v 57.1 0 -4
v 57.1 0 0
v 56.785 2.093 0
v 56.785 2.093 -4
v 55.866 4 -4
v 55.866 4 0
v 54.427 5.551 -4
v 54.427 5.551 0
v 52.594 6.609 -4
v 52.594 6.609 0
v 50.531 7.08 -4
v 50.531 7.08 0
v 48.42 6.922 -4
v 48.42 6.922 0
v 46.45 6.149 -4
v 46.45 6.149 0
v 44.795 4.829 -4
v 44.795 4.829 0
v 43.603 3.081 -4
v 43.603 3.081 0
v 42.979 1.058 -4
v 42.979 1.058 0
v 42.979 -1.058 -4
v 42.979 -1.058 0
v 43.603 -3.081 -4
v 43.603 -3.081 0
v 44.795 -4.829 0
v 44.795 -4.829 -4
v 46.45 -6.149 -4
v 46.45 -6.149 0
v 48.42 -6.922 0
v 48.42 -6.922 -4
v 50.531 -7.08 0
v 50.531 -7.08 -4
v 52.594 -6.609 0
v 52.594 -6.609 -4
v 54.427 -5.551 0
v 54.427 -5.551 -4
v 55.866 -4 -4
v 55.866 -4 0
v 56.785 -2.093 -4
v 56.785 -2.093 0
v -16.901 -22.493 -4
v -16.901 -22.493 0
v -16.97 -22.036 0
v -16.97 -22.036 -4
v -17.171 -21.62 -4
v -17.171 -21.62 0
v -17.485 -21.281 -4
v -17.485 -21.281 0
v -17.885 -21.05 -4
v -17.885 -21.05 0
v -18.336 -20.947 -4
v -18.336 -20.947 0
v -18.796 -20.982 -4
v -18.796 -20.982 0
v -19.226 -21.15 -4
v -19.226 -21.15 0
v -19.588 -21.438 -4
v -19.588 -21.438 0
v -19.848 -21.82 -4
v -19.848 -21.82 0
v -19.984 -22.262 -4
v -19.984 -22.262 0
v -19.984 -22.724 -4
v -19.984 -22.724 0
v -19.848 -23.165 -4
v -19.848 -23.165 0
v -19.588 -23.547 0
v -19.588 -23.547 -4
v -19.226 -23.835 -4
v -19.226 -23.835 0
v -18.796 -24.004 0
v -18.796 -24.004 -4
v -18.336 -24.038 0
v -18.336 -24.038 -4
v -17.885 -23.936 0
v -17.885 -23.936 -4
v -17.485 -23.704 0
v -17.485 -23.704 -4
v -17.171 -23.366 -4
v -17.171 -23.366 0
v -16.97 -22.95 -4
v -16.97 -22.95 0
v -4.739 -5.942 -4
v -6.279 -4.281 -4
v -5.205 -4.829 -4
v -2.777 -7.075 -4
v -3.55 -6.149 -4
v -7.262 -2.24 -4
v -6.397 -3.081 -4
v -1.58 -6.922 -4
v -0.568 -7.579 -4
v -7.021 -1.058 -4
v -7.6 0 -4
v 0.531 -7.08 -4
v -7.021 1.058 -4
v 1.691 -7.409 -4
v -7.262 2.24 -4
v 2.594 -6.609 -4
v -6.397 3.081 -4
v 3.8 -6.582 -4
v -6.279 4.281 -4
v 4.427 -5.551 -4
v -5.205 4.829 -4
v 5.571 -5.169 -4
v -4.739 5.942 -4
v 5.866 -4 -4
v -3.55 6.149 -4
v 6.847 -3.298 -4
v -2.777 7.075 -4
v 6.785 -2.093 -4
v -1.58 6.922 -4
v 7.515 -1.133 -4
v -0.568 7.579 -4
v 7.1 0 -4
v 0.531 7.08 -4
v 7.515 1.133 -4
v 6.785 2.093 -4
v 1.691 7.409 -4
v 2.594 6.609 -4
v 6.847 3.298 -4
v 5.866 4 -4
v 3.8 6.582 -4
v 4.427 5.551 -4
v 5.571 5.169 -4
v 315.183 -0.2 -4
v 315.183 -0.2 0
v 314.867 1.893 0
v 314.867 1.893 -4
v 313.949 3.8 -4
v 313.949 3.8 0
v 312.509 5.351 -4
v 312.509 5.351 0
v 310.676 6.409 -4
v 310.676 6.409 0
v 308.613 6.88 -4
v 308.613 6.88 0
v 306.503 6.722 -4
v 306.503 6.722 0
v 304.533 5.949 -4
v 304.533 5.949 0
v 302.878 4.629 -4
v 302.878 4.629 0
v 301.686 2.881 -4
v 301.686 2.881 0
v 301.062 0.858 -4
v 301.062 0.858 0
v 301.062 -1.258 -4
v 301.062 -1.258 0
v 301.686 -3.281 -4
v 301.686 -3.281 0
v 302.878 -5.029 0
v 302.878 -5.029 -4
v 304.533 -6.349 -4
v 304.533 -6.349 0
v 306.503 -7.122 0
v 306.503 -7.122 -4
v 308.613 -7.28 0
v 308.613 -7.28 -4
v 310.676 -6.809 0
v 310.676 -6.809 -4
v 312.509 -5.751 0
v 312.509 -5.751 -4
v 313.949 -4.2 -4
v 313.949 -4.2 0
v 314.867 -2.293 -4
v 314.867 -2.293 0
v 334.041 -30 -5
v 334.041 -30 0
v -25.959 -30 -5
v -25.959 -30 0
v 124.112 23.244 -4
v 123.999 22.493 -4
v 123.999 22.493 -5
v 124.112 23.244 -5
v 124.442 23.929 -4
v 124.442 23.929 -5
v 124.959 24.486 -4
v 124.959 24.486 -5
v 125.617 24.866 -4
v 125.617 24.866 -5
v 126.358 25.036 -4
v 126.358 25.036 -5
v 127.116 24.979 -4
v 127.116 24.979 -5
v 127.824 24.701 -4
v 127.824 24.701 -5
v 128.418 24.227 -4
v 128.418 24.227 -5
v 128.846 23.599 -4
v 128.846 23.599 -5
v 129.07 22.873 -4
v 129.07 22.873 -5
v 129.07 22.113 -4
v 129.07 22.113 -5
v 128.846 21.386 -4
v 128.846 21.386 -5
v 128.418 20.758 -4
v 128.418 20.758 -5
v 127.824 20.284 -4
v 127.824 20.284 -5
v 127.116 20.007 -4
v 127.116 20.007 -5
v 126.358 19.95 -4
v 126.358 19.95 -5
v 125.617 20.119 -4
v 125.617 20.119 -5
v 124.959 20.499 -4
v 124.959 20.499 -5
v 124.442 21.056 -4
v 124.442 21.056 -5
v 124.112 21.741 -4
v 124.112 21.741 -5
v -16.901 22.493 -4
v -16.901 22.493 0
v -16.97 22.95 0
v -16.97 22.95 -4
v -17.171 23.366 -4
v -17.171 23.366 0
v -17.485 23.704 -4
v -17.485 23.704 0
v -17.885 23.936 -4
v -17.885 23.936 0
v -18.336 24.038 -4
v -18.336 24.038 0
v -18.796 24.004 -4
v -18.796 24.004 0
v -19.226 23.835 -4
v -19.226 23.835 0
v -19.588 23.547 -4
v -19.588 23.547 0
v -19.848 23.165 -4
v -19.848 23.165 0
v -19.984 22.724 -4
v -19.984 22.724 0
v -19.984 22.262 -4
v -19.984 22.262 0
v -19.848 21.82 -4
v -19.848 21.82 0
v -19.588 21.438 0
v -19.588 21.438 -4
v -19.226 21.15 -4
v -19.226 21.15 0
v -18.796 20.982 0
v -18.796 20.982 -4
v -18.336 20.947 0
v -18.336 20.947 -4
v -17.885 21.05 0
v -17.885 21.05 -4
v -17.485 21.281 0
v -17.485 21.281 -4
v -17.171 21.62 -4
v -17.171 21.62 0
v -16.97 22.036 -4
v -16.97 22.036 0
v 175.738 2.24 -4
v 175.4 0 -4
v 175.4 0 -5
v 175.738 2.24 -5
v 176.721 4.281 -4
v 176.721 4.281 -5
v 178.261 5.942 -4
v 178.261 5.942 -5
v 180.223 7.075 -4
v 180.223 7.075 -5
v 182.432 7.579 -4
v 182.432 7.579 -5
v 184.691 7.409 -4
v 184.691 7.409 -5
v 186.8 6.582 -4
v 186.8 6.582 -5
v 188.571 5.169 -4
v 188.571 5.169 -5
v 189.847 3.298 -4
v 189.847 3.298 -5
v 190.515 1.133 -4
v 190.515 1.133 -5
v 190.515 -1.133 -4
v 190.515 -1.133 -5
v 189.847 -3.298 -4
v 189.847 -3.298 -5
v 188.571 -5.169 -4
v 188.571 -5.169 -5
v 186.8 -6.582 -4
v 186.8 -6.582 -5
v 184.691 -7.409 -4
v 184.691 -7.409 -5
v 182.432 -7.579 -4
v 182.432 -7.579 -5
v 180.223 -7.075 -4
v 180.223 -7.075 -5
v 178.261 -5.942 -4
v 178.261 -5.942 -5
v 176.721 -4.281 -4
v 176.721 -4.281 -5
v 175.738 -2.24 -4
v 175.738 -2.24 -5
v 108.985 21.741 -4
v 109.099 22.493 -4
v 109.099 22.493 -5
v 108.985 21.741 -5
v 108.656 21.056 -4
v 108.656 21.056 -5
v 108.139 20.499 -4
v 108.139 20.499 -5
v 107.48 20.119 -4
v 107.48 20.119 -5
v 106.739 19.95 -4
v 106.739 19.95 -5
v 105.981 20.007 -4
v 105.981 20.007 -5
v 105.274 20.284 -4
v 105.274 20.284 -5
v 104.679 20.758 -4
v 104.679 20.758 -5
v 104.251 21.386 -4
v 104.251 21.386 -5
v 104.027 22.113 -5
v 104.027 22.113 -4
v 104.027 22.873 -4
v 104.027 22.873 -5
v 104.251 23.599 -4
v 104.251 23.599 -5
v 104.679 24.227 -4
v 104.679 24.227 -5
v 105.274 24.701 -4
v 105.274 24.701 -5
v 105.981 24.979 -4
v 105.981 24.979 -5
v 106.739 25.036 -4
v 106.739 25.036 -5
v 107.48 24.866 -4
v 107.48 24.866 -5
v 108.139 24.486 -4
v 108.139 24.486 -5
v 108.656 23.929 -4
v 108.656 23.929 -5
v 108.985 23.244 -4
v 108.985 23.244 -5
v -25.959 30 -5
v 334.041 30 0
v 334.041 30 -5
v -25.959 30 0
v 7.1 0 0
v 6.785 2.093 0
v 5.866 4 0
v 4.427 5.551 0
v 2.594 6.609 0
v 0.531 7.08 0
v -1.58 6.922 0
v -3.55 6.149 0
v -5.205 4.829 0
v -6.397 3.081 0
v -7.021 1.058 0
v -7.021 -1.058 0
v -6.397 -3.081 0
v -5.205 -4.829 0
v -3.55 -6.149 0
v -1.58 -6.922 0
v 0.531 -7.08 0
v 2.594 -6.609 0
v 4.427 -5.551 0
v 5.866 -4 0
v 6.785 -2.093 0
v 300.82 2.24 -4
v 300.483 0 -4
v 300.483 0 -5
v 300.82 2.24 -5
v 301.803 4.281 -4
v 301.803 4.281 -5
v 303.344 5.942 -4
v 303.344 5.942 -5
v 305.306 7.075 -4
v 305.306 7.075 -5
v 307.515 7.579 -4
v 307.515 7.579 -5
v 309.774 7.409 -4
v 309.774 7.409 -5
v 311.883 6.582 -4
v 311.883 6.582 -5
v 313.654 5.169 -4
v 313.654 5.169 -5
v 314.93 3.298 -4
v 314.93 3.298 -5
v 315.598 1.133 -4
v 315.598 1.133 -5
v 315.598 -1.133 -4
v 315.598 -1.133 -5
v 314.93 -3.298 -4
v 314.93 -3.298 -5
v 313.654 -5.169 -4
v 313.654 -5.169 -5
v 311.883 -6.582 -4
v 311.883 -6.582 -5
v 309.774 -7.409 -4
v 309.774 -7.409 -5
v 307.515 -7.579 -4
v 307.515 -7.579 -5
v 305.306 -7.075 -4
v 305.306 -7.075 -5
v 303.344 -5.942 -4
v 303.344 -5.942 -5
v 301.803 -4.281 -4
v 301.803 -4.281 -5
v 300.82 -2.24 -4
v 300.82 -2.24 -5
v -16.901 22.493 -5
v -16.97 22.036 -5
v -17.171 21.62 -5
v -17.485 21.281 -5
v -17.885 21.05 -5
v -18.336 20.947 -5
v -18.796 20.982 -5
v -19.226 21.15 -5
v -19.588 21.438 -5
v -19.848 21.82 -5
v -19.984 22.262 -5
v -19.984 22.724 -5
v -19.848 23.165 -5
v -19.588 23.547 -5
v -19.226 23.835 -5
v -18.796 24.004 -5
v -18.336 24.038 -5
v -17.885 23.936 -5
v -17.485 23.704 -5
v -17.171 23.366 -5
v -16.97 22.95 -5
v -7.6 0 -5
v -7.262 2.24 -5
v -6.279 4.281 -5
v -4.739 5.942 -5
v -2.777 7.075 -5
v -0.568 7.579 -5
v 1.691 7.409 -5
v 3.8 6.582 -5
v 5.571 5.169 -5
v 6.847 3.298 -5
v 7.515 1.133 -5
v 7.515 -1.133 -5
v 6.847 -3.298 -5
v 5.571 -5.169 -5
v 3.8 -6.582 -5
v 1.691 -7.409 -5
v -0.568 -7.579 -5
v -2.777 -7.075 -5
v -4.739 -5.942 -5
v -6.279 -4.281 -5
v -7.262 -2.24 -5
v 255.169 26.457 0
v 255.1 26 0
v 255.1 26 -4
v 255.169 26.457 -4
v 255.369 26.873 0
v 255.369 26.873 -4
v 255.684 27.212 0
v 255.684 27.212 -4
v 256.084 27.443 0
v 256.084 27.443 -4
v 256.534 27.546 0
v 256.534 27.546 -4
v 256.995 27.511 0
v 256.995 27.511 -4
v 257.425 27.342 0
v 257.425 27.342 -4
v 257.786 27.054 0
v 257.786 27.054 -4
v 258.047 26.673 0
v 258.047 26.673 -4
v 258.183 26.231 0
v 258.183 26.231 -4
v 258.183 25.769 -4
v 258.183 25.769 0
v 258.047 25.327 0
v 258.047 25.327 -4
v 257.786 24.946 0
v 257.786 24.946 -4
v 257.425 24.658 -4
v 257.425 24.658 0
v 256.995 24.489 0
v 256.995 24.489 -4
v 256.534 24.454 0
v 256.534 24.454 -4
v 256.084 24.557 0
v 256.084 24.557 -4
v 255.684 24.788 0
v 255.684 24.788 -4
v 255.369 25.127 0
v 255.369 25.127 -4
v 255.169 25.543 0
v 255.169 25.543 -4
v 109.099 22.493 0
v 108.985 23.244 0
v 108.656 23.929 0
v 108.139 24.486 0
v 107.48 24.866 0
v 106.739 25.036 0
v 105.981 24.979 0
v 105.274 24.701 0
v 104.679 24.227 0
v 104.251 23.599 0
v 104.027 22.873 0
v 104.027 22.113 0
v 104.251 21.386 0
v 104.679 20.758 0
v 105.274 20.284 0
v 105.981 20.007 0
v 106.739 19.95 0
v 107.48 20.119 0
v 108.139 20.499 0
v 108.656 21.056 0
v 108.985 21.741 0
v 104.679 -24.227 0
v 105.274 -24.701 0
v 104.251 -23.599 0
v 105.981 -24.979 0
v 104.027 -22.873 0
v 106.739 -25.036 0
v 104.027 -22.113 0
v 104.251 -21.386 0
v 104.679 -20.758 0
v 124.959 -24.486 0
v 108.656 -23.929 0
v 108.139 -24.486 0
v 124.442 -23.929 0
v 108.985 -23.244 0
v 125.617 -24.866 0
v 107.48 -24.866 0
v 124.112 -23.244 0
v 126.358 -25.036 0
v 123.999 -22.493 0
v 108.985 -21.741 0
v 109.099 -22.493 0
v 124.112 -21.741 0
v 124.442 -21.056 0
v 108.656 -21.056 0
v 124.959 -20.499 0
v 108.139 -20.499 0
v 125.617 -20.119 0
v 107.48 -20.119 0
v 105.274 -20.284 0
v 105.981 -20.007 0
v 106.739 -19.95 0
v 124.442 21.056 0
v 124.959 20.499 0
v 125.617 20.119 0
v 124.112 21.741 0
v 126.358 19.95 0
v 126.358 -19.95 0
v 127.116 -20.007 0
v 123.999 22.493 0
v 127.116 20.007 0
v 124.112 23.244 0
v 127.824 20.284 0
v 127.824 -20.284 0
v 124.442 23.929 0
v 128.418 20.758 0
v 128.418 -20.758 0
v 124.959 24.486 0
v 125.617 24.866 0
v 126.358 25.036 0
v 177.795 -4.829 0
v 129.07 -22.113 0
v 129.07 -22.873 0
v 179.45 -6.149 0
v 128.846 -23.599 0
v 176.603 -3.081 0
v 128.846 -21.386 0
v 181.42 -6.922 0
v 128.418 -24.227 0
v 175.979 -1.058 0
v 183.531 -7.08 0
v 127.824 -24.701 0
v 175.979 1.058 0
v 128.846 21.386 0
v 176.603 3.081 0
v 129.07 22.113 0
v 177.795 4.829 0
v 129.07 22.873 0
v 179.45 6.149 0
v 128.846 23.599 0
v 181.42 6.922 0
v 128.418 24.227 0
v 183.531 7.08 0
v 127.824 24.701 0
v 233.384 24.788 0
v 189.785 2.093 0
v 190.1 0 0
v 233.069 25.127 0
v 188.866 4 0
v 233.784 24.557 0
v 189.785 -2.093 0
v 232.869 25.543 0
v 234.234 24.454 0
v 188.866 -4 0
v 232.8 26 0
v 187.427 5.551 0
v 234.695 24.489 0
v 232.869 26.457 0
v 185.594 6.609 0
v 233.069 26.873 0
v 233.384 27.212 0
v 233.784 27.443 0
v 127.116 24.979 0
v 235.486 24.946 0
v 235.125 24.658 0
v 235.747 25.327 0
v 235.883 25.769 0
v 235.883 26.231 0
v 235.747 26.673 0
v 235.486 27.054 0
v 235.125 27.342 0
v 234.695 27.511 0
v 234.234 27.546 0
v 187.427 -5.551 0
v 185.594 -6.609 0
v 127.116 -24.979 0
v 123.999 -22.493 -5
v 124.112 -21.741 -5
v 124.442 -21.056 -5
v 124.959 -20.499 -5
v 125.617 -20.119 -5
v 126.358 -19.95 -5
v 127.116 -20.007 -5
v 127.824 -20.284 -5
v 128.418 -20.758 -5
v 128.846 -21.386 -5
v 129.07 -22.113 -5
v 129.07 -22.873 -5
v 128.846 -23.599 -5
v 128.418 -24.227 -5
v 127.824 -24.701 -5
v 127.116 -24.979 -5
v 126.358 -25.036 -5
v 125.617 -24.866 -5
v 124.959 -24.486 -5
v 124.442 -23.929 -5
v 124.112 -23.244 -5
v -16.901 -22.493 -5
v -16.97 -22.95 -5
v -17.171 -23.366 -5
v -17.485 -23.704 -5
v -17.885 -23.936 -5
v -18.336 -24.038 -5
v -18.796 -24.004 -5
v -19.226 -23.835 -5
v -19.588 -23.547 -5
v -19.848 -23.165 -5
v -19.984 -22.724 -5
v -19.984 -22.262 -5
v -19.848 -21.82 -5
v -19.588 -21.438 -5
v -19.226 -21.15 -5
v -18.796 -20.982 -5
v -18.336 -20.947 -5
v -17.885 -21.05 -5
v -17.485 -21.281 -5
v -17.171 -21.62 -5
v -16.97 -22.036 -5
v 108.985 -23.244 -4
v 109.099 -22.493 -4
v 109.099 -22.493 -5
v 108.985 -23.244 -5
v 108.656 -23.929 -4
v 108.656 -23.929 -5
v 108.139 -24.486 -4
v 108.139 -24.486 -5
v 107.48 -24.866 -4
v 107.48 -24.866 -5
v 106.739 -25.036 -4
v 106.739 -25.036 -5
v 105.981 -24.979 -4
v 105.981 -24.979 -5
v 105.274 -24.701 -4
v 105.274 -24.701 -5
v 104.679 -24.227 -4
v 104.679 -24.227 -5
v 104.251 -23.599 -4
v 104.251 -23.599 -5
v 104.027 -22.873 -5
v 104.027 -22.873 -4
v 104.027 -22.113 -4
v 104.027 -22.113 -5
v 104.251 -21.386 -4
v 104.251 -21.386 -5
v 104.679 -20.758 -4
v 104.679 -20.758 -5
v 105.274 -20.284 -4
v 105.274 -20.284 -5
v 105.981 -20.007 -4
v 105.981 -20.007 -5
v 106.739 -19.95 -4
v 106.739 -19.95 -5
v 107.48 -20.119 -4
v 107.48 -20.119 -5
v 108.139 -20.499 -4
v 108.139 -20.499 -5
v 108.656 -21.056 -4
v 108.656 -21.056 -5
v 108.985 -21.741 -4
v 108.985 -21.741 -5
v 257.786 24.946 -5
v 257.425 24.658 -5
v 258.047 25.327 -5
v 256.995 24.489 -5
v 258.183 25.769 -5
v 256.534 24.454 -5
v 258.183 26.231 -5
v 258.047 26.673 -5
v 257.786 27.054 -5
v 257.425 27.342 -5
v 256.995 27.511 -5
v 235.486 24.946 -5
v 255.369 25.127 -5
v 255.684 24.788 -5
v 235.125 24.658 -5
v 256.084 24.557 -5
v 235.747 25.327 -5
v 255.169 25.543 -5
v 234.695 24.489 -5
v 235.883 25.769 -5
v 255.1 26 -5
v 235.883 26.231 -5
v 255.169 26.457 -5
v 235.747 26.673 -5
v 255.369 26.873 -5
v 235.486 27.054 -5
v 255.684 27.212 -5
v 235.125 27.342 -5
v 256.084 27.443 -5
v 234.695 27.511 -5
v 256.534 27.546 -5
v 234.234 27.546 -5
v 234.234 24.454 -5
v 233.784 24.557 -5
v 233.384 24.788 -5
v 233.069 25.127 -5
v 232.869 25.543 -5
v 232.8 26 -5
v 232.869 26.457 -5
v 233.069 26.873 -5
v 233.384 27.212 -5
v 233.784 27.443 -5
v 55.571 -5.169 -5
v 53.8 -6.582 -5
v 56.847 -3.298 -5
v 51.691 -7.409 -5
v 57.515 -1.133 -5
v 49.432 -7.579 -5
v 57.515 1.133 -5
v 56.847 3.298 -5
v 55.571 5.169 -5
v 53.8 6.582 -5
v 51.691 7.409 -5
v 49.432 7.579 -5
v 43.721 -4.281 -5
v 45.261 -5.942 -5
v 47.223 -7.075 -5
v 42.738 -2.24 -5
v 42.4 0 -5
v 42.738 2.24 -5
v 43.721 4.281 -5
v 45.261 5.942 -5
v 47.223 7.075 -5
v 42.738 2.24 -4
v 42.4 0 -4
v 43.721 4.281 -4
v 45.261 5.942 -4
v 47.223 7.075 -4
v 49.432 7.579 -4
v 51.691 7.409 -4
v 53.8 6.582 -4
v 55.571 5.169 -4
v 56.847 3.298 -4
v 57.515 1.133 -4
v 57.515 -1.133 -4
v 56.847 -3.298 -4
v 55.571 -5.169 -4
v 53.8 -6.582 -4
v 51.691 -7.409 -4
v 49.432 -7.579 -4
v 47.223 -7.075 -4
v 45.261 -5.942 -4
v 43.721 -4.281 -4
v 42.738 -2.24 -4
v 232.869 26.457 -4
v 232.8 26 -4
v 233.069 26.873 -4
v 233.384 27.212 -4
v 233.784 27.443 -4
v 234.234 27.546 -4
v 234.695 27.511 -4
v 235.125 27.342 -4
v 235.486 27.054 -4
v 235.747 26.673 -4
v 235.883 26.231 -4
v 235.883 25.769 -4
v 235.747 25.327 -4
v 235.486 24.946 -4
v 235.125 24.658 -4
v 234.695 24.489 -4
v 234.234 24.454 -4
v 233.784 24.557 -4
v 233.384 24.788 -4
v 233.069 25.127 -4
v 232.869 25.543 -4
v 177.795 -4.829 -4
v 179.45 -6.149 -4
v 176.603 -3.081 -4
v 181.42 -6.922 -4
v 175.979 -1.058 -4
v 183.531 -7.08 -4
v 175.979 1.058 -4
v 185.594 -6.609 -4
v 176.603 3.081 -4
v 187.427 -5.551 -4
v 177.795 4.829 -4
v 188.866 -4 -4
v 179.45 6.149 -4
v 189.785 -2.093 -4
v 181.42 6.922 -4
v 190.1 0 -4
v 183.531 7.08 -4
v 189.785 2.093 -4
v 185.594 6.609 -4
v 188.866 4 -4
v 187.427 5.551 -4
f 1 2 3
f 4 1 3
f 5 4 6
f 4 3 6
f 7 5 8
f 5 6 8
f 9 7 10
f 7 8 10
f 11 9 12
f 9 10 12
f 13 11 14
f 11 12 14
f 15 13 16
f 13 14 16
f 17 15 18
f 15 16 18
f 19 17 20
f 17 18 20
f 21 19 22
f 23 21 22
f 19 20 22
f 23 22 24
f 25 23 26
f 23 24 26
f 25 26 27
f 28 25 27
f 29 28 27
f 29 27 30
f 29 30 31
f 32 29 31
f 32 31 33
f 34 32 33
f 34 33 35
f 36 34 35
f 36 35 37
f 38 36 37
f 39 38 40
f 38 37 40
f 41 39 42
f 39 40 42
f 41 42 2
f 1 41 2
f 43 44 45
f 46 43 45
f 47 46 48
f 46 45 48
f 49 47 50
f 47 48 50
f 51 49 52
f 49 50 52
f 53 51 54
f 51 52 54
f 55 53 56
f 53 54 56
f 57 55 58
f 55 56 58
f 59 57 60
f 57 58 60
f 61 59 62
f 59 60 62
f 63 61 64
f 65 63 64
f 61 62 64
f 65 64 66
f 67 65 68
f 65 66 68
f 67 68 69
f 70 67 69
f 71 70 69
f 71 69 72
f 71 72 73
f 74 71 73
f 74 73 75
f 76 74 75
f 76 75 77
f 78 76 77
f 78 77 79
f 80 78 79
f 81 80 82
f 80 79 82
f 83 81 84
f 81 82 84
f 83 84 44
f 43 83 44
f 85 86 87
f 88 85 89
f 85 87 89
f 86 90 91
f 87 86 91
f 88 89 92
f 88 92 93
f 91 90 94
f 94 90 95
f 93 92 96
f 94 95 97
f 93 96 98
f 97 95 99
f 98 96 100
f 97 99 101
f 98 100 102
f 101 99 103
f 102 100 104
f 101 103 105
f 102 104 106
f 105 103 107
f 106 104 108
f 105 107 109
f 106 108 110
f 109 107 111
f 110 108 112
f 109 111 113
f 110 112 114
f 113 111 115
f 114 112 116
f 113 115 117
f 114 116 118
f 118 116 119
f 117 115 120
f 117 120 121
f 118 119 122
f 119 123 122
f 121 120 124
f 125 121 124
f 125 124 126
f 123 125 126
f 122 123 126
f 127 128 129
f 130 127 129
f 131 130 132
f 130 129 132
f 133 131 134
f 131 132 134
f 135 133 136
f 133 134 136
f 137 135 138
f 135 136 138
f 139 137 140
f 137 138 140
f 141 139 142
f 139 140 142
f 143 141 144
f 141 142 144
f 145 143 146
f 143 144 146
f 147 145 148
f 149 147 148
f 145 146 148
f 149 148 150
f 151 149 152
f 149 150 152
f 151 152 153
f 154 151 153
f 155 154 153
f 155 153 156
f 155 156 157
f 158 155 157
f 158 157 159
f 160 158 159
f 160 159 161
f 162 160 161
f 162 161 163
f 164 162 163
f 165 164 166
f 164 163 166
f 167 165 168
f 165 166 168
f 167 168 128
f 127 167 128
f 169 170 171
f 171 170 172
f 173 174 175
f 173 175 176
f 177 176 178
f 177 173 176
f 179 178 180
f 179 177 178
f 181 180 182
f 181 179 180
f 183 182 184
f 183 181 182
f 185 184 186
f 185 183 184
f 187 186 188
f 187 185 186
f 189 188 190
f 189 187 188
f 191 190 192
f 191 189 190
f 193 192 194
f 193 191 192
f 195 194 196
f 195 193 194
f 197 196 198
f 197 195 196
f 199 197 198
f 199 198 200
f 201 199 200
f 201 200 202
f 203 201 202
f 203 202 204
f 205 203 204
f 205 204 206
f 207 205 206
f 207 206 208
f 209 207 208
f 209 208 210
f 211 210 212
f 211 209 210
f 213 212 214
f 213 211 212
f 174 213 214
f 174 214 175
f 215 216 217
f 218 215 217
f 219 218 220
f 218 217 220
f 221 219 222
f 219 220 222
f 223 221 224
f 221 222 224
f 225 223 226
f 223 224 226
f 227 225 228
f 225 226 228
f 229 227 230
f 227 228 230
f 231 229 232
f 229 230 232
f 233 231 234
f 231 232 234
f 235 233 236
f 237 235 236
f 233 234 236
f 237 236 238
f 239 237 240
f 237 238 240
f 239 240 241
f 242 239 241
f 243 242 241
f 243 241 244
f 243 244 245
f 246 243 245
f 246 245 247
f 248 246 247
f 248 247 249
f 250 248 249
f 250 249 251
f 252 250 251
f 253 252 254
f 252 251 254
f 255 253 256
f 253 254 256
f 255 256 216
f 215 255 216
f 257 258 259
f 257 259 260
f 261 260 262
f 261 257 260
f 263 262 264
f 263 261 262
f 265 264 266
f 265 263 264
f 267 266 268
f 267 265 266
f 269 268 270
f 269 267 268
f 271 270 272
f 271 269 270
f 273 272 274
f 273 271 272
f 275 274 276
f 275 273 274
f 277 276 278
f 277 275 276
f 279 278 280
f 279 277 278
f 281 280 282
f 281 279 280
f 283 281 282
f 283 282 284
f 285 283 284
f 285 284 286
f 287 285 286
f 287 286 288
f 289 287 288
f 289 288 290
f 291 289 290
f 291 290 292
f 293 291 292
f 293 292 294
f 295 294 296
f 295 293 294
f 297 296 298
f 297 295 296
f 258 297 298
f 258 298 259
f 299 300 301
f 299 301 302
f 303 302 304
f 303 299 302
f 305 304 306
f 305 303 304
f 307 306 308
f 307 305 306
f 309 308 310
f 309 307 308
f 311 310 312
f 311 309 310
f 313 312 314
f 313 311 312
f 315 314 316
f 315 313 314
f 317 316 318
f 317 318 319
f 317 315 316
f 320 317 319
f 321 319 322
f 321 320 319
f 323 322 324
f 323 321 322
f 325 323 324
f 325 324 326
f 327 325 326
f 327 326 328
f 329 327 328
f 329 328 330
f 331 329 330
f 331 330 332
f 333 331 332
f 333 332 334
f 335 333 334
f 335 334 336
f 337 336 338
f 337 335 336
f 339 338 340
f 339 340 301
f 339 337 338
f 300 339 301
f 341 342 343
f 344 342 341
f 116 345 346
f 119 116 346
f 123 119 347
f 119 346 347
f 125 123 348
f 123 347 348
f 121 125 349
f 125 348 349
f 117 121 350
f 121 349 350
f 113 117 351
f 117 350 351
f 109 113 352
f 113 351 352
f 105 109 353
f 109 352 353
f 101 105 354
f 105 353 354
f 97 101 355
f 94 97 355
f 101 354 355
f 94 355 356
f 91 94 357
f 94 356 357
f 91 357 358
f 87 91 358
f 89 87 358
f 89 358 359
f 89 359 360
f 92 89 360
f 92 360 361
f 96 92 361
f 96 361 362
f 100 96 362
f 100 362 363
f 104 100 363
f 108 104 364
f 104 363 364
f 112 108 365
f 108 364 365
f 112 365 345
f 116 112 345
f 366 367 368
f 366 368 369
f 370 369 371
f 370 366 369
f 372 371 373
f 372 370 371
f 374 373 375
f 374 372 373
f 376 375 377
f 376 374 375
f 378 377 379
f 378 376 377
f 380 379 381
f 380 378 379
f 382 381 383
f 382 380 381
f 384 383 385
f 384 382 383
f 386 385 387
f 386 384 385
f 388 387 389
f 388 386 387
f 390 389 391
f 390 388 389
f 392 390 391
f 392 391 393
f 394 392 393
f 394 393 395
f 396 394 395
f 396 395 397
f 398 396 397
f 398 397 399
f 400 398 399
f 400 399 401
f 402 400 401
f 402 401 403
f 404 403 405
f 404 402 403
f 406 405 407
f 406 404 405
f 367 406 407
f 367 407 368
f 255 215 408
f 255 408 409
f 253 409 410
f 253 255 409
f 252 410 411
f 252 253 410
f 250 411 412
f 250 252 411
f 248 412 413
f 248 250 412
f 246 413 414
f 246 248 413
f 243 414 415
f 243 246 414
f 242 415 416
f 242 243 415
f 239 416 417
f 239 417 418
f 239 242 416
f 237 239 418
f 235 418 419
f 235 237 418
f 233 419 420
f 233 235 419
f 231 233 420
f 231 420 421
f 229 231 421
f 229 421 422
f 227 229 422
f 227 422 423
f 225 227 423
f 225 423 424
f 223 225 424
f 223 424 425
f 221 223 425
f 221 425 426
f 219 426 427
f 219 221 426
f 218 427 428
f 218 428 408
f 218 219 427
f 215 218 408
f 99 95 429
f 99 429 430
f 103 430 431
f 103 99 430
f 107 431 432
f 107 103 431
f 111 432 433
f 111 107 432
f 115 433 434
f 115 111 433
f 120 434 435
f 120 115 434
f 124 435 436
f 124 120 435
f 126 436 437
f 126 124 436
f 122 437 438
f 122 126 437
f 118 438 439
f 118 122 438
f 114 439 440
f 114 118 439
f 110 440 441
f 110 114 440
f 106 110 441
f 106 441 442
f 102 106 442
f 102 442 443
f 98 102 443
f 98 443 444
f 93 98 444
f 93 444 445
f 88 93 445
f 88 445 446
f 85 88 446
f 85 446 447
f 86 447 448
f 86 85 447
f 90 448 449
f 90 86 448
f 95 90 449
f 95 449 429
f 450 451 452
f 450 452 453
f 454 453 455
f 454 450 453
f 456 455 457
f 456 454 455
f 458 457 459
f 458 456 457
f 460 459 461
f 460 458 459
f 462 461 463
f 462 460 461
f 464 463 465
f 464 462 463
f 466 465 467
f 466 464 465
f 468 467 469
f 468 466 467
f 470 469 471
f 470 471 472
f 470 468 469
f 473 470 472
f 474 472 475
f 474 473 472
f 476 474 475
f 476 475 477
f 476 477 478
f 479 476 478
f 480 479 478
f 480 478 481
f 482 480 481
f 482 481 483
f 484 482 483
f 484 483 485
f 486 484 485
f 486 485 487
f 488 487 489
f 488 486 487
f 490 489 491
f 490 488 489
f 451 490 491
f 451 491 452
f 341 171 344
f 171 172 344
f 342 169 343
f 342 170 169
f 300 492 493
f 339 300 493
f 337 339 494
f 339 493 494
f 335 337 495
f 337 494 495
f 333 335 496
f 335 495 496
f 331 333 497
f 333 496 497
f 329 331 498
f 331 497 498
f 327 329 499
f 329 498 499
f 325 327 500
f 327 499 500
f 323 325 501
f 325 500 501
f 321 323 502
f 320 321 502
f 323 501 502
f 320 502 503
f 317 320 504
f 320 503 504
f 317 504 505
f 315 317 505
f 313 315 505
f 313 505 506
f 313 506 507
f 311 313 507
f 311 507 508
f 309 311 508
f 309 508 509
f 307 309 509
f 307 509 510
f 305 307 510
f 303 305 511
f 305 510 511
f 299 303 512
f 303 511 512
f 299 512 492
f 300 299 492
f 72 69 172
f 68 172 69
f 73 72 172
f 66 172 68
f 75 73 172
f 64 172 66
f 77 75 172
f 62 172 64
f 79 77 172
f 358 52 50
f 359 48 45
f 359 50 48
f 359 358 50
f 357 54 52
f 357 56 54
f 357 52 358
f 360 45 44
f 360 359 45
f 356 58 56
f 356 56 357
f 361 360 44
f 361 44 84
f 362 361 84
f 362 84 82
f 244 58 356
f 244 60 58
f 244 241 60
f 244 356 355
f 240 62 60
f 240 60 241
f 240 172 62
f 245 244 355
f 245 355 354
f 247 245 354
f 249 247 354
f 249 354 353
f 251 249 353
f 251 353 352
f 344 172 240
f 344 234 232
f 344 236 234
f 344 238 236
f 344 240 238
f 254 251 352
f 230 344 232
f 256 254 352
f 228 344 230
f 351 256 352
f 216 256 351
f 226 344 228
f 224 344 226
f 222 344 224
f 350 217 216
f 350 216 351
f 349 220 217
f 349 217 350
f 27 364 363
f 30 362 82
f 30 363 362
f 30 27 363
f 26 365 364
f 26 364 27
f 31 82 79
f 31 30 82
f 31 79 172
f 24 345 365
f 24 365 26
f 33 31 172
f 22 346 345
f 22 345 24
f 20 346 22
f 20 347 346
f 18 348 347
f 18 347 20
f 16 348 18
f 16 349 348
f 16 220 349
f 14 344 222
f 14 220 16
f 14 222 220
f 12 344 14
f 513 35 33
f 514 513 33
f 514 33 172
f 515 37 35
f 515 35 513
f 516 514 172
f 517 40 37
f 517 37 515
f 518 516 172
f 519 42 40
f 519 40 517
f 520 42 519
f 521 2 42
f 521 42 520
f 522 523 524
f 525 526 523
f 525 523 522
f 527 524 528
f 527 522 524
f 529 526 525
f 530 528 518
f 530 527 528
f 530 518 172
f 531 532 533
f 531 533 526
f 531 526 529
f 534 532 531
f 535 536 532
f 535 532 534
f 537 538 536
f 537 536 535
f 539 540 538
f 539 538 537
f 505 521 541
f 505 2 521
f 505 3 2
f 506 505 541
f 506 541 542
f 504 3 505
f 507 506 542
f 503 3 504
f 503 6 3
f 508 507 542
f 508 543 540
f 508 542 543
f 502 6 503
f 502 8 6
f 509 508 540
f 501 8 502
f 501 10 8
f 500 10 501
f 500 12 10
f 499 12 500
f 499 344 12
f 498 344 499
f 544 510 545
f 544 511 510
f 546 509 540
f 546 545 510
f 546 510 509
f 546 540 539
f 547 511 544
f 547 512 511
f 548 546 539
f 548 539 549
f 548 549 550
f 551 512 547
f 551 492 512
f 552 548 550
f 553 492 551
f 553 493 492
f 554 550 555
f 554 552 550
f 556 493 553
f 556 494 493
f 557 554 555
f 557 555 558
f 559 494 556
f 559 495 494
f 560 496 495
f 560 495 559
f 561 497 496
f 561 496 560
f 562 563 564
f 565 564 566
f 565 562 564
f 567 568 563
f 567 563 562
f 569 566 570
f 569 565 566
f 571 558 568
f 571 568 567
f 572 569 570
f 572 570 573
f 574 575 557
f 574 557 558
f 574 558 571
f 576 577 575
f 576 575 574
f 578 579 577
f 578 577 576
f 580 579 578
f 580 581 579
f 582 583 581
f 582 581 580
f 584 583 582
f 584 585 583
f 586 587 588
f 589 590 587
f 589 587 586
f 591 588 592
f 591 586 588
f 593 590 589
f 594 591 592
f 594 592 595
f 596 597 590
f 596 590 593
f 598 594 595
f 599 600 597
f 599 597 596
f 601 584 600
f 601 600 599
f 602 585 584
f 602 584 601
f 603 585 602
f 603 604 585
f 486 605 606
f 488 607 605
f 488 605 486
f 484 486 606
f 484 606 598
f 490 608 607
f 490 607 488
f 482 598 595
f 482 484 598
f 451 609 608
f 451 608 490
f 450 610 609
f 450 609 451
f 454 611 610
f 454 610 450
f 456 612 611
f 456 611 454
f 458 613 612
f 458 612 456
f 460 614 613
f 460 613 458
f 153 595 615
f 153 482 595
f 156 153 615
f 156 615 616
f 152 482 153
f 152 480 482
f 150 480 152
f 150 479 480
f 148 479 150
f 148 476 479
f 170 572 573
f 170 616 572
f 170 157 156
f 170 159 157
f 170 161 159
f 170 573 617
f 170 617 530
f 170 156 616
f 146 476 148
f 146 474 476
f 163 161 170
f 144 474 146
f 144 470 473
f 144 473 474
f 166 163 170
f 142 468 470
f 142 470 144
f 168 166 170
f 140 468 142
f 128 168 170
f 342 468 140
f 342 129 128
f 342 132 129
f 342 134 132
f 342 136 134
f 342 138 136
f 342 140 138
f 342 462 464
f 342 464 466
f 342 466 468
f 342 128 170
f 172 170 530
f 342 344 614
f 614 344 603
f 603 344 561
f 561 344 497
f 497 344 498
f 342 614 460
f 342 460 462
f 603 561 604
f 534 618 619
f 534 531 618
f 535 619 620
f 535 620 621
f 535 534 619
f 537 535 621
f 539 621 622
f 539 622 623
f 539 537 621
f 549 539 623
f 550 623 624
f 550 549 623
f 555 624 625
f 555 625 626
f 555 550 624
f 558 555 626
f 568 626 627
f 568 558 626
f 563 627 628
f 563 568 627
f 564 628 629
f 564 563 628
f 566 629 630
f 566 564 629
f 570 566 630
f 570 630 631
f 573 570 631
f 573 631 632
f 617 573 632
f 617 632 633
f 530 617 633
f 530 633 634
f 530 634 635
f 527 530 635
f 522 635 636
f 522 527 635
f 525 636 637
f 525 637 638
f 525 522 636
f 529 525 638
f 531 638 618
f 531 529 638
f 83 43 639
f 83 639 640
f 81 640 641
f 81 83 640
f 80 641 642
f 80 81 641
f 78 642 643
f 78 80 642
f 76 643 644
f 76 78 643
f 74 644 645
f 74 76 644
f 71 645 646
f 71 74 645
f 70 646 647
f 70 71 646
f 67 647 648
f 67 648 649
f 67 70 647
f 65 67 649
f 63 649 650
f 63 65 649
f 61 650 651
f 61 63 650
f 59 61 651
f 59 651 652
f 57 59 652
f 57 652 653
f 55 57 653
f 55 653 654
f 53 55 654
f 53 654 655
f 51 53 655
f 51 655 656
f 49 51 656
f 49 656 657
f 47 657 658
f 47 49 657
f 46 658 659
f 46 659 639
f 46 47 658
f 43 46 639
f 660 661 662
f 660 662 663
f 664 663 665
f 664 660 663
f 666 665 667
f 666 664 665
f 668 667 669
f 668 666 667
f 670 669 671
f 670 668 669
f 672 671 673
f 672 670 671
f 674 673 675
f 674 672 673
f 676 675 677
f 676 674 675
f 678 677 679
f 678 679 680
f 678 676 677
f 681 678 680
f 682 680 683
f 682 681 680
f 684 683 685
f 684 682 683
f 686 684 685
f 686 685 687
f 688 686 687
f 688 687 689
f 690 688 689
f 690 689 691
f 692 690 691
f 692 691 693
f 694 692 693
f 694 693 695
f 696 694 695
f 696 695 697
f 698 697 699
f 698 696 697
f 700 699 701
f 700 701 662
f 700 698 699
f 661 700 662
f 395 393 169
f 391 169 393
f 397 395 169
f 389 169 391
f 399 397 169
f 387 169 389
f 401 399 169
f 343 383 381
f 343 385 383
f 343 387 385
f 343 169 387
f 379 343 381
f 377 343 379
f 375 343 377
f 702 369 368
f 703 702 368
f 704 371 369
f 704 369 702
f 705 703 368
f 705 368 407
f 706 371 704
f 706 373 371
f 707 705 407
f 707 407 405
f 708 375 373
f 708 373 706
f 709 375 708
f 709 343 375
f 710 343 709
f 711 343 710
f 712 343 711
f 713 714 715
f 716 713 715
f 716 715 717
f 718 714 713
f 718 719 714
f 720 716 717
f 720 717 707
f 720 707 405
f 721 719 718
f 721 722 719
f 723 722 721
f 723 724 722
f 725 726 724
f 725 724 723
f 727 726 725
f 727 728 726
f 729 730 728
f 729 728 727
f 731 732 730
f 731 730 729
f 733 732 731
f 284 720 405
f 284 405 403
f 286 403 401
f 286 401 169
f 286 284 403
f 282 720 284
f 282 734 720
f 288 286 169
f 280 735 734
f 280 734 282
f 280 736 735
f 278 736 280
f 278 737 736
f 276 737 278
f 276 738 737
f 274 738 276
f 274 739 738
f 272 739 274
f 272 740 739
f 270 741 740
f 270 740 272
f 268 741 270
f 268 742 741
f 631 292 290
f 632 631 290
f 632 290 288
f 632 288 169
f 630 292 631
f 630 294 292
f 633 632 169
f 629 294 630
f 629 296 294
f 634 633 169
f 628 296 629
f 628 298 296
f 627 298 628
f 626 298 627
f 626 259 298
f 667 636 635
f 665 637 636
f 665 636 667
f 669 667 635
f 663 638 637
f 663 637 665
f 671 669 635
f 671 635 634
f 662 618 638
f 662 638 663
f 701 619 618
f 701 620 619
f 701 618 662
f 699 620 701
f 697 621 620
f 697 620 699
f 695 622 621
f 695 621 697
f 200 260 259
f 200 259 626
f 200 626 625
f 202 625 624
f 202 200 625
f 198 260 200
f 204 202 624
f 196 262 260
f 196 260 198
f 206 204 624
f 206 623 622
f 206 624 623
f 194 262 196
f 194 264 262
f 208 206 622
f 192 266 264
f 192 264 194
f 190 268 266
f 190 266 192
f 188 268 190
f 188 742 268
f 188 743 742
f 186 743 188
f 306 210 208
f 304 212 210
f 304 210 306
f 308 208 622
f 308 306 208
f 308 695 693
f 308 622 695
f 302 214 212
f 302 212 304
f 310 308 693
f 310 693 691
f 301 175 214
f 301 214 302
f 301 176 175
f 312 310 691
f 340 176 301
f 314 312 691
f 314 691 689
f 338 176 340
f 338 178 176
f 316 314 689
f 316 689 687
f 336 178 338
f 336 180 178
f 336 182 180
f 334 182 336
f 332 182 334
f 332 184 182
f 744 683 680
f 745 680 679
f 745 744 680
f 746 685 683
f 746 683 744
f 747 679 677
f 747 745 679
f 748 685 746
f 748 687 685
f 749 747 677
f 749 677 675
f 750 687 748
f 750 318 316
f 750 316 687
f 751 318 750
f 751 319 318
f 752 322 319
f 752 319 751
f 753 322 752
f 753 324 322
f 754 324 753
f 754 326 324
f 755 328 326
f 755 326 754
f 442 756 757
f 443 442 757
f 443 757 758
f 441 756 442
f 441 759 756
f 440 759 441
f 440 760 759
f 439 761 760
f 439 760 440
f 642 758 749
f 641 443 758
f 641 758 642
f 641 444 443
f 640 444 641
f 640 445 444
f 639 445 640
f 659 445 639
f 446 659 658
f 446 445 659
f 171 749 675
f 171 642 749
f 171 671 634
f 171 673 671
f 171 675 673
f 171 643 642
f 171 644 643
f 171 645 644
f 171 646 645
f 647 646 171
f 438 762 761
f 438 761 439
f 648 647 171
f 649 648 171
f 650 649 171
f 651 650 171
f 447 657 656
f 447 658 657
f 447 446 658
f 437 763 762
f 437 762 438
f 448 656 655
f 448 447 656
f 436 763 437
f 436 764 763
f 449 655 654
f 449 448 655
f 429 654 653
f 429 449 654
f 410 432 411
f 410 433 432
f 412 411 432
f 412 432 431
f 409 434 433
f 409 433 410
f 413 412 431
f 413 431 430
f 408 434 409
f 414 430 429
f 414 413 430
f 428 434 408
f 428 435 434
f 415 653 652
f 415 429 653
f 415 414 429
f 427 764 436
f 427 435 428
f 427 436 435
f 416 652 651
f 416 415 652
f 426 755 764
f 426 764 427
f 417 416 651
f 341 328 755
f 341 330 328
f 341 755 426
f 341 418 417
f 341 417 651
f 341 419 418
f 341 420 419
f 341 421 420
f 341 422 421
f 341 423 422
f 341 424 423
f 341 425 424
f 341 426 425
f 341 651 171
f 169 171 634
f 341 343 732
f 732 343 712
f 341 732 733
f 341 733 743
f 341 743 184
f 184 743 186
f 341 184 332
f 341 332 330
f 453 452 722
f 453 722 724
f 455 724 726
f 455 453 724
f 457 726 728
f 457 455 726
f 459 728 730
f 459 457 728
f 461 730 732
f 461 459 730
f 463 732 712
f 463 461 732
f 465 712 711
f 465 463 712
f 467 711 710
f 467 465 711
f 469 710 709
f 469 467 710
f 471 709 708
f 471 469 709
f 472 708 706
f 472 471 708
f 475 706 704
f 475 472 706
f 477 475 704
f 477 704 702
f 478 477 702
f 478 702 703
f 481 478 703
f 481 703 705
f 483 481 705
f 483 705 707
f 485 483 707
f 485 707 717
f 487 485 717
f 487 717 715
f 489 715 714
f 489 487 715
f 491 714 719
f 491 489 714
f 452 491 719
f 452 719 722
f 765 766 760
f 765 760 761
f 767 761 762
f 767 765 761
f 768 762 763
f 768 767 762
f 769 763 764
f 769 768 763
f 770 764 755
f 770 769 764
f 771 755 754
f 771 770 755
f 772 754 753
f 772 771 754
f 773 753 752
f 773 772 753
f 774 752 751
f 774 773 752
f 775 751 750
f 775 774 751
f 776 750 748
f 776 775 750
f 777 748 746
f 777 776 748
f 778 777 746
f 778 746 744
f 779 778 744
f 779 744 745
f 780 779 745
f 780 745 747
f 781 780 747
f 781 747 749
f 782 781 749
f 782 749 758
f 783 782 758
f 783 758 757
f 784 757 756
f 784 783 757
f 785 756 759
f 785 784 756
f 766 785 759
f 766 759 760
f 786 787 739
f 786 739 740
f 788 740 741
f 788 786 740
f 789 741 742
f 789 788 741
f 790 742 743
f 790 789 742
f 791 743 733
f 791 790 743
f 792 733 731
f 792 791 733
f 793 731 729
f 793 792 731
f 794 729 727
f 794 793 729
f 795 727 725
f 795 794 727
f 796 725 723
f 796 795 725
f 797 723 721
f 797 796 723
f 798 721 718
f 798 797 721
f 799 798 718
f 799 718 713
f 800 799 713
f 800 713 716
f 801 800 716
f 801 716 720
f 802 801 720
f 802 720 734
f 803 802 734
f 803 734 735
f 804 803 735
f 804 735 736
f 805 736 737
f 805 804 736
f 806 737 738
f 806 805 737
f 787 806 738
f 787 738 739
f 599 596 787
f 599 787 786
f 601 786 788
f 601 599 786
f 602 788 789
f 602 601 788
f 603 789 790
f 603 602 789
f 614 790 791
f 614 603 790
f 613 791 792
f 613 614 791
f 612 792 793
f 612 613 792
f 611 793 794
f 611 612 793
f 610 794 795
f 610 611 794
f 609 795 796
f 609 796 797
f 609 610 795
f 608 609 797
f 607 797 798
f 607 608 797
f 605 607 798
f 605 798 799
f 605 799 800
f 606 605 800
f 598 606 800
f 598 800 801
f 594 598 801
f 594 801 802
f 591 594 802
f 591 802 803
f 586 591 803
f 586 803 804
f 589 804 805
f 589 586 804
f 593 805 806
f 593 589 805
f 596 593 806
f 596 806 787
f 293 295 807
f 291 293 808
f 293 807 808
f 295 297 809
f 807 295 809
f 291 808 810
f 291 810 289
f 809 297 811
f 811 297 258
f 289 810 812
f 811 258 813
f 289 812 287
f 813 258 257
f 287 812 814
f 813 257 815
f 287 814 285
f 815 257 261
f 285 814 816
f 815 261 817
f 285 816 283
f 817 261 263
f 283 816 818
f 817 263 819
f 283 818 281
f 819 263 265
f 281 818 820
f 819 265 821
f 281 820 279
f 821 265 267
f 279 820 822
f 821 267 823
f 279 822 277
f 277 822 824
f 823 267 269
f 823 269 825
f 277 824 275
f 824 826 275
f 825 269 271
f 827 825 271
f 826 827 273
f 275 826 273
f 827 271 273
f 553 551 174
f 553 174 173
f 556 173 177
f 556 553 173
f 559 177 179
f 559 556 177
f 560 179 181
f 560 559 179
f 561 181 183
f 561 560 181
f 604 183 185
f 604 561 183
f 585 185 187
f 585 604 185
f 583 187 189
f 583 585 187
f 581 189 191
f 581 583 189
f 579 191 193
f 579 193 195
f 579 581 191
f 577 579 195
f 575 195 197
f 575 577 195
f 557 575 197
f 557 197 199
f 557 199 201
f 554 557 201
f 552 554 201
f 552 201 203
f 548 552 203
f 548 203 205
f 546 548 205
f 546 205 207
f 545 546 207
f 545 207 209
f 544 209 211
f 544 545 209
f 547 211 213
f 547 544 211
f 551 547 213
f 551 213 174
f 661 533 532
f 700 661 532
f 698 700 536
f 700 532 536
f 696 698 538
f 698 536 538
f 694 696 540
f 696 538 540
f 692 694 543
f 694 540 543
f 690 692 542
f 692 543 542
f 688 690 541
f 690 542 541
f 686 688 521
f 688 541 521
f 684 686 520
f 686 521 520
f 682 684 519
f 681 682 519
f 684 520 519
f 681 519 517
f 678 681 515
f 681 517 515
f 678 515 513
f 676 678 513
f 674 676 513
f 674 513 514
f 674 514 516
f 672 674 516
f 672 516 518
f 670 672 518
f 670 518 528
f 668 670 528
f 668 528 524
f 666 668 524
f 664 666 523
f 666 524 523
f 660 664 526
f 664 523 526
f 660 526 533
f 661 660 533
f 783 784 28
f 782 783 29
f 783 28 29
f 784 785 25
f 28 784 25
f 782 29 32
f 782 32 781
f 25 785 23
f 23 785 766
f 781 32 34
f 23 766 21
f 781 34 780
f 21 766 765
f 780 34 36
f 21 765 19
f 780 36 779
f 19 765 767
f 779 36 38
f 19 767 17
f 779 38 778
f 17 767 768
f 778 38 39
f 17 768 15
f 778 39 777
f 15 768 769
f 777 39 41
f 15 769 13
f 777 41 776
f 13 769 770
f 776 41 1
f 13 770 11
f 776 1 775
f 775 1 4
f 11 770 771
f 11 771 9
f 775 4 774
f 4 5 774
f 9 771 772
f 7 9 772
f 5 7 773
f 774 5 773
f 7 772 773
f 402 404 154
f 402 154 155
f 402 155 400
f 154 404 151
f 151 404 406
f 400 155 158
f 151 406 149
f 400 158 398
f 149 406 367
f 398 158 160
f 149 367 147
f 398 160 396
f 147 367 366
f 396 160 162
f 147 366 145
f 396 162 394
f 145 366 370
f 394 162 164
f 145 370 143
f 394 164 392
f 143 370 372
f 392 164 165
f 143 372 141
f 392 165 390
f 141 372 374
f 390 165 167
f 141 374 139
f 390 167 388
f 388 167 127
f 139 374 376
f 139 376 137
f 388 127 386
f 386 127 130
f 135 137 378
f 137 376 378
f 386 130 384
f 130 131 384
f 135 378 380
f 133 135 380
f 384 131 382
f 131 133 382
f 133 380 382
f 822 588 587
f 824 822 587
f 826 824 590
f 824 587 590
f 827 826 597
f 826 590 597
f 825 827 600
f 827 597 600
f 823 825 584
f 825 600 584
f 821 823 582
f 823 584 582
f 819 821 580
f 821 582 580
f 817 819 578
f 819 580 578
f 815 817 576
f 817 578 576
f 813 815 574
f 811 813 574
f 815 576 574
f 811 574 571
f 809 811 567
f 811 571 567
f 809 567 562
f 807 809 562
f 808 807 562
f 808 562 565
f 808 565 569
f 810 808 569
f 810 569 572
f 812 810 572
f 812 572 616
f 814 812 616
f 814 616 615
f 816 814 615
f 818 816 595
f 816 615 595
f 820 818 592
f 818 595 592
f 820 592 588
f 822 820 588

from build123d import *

# Parameters (mm, degrees)
SKETCH1_W           = 360
SKETCH1_H           = 60
SKETCH1_R           = 7.1
SKETCH1_R_2         = 1.55
SKETCH1_R_3         = 2.55
BOSS_EXTRUDE1_DEPTH = 4
SKETCH2_W           = 360
SKETCH2_H           = 60
SKETCH2_R           = 2.55
SKETCH2_R_2         = 1.55
SKETCH2_R_3         = 7.6
BOSS_EXTRUDE2_DEPTH = 1
CUT_EXTRUDE1_START  = -4
SKETCH2_3_R         = 2.55
SKETCH2_3_R_2       = 1.55
CUT_EXTRUDE1_DEPTH  = 4


with BuildPart() as part:
    # Sketch1 → Boss-Extrude1 (new body)
    with BuildSketch(Plane.XY):
        with Locations((154.041275094, 0)):
            Rectangle(SKETCH1_W, SKETCH1_H)
        with Locations((308.082550187, -0.2)):
            Circle(SKETCH1_R, mode=Mode.SUBTRACT)
        with Locations((-18.451377883, 22.492652976)):
            Circle(SKETCH1_R_2, mode=Mode.SUBTRACT)
        Circle(SKETCH1_R, mode=Mode.SUBTRACT)
        with Locations((-18.451377883, -22.492652976)):
            Circle(SKETCH1_R_2, mode=Mode.SUBTRACT)
        with Locations((50, 0)):
            Circle(SKETCH1_R, mode=Mode.SUBTRACT)
        with Locations((183, 0)):
            Circle(SKETCH1_R, mode=Mode.SUBTRACT)
        with Locations((106.548622117, -22.492652976)):
            Circle(SKETCH1_R_3, mode=Mode.SUBTRACT)
        with Locations((106.548622117, 22.492652976)):
            Circle(SKETCH1_R_3, mode=Mode.SUBTRACT)
    extrude(amount=-BOSS_EXTRUDE1_DEPTH)

    # Sketch2 → Boss-Extrude2 (add)
    with BuildSketch(Plane(origin=(0, 0, -4), x_dir=(-1, 0, 0), z_dir=(0, 0, -1))):
        with Locations((-154.041275094, 0)):
            Rectangle(SKETCH2_W, SKETCH2_H)
        with Locations((-126.548622117, -22.492652976)):
            Circle(SKETCH2_R, mode=Mode.SUBTRACT)
        with Locations(Location((-106.548622117, -22.492652976, 0), (0, 0, 180))):
            Circle(SKETCH2_R, mode=Mode.SUBTRACT)
        with Locations(Location((18.451377883, -22.492652976, 0), (0, 0, 180))):
            Circle(SKETCH2_R_2, mode=Mode.SUBTRACT)
        Circle(SKETCH2_R_3, mode=Mode.SUBTRACT)
        with Locations((-308.082550187, 0)):
            Circle(SKETCH2_R_3, mode=Mode.SUBTRACT)
        with Locations((-183, 0)):
            Circle(SKETCH2_R_3, mode=Mode.SUBTRACT)
        with Locations((-256.65, 26)):
            Circle(SKETCH2_R_2, mode=Mode.SUBTRACT)
        with Locations((-234.35, 26)):
            Circle(SKETCH2_R_2, mode=Mode.SUBTRACT)
        with Locations((-50, 0)):
            Circle(SKETCH2_R_3, mode=Mode.SUBTRACT)
        with Locations((-126.548622117, 22.492652976)):
            Circle(SKETCH2_R, mode=Mode.SUBTRACT)
        with Locations(Location((-106.548622117, 22.492652976, 0), (0, 0, 180))):
            Circle(SKETCH2_R, mode=Mode.SUBTRACT)
        with Locations(Location((18.451377883, 22.492652976, 0), (0, 0, 180))):
            Circle(SKETCH2_R_2, mode=Mode.SUBTRACT)
    extrude(amount=BOSS_EXTRUDE2_DEPTH)

    # Sketch2<3> → Cut-Extrude1 (cut)
    with BuildSketch(Plane(origin=(0, 0, -4), x_dir=(-1, 0, 0), z_dir=(0, 0, -1)).offset(CUT_EXTRUDE1_START)):
        with Locations((-126.548622117, 22.492652976)):
            Circle(SKETCH2_3_R)
        with Locations((-126.548622117, -22.492652976)):
            Circle(SKETCH2_3_R)
        with Locations((-256.65, 26)):
            Circle(SKETCH2_3_R_2)
        with Locations((-234.35, 26)):
            Circle(SKETCH2_3_R_2)
    extrude(amount=CUT_EXTRUDE1_DEPTH, mode=Mode.SUBTRACT)


solid = part.part
